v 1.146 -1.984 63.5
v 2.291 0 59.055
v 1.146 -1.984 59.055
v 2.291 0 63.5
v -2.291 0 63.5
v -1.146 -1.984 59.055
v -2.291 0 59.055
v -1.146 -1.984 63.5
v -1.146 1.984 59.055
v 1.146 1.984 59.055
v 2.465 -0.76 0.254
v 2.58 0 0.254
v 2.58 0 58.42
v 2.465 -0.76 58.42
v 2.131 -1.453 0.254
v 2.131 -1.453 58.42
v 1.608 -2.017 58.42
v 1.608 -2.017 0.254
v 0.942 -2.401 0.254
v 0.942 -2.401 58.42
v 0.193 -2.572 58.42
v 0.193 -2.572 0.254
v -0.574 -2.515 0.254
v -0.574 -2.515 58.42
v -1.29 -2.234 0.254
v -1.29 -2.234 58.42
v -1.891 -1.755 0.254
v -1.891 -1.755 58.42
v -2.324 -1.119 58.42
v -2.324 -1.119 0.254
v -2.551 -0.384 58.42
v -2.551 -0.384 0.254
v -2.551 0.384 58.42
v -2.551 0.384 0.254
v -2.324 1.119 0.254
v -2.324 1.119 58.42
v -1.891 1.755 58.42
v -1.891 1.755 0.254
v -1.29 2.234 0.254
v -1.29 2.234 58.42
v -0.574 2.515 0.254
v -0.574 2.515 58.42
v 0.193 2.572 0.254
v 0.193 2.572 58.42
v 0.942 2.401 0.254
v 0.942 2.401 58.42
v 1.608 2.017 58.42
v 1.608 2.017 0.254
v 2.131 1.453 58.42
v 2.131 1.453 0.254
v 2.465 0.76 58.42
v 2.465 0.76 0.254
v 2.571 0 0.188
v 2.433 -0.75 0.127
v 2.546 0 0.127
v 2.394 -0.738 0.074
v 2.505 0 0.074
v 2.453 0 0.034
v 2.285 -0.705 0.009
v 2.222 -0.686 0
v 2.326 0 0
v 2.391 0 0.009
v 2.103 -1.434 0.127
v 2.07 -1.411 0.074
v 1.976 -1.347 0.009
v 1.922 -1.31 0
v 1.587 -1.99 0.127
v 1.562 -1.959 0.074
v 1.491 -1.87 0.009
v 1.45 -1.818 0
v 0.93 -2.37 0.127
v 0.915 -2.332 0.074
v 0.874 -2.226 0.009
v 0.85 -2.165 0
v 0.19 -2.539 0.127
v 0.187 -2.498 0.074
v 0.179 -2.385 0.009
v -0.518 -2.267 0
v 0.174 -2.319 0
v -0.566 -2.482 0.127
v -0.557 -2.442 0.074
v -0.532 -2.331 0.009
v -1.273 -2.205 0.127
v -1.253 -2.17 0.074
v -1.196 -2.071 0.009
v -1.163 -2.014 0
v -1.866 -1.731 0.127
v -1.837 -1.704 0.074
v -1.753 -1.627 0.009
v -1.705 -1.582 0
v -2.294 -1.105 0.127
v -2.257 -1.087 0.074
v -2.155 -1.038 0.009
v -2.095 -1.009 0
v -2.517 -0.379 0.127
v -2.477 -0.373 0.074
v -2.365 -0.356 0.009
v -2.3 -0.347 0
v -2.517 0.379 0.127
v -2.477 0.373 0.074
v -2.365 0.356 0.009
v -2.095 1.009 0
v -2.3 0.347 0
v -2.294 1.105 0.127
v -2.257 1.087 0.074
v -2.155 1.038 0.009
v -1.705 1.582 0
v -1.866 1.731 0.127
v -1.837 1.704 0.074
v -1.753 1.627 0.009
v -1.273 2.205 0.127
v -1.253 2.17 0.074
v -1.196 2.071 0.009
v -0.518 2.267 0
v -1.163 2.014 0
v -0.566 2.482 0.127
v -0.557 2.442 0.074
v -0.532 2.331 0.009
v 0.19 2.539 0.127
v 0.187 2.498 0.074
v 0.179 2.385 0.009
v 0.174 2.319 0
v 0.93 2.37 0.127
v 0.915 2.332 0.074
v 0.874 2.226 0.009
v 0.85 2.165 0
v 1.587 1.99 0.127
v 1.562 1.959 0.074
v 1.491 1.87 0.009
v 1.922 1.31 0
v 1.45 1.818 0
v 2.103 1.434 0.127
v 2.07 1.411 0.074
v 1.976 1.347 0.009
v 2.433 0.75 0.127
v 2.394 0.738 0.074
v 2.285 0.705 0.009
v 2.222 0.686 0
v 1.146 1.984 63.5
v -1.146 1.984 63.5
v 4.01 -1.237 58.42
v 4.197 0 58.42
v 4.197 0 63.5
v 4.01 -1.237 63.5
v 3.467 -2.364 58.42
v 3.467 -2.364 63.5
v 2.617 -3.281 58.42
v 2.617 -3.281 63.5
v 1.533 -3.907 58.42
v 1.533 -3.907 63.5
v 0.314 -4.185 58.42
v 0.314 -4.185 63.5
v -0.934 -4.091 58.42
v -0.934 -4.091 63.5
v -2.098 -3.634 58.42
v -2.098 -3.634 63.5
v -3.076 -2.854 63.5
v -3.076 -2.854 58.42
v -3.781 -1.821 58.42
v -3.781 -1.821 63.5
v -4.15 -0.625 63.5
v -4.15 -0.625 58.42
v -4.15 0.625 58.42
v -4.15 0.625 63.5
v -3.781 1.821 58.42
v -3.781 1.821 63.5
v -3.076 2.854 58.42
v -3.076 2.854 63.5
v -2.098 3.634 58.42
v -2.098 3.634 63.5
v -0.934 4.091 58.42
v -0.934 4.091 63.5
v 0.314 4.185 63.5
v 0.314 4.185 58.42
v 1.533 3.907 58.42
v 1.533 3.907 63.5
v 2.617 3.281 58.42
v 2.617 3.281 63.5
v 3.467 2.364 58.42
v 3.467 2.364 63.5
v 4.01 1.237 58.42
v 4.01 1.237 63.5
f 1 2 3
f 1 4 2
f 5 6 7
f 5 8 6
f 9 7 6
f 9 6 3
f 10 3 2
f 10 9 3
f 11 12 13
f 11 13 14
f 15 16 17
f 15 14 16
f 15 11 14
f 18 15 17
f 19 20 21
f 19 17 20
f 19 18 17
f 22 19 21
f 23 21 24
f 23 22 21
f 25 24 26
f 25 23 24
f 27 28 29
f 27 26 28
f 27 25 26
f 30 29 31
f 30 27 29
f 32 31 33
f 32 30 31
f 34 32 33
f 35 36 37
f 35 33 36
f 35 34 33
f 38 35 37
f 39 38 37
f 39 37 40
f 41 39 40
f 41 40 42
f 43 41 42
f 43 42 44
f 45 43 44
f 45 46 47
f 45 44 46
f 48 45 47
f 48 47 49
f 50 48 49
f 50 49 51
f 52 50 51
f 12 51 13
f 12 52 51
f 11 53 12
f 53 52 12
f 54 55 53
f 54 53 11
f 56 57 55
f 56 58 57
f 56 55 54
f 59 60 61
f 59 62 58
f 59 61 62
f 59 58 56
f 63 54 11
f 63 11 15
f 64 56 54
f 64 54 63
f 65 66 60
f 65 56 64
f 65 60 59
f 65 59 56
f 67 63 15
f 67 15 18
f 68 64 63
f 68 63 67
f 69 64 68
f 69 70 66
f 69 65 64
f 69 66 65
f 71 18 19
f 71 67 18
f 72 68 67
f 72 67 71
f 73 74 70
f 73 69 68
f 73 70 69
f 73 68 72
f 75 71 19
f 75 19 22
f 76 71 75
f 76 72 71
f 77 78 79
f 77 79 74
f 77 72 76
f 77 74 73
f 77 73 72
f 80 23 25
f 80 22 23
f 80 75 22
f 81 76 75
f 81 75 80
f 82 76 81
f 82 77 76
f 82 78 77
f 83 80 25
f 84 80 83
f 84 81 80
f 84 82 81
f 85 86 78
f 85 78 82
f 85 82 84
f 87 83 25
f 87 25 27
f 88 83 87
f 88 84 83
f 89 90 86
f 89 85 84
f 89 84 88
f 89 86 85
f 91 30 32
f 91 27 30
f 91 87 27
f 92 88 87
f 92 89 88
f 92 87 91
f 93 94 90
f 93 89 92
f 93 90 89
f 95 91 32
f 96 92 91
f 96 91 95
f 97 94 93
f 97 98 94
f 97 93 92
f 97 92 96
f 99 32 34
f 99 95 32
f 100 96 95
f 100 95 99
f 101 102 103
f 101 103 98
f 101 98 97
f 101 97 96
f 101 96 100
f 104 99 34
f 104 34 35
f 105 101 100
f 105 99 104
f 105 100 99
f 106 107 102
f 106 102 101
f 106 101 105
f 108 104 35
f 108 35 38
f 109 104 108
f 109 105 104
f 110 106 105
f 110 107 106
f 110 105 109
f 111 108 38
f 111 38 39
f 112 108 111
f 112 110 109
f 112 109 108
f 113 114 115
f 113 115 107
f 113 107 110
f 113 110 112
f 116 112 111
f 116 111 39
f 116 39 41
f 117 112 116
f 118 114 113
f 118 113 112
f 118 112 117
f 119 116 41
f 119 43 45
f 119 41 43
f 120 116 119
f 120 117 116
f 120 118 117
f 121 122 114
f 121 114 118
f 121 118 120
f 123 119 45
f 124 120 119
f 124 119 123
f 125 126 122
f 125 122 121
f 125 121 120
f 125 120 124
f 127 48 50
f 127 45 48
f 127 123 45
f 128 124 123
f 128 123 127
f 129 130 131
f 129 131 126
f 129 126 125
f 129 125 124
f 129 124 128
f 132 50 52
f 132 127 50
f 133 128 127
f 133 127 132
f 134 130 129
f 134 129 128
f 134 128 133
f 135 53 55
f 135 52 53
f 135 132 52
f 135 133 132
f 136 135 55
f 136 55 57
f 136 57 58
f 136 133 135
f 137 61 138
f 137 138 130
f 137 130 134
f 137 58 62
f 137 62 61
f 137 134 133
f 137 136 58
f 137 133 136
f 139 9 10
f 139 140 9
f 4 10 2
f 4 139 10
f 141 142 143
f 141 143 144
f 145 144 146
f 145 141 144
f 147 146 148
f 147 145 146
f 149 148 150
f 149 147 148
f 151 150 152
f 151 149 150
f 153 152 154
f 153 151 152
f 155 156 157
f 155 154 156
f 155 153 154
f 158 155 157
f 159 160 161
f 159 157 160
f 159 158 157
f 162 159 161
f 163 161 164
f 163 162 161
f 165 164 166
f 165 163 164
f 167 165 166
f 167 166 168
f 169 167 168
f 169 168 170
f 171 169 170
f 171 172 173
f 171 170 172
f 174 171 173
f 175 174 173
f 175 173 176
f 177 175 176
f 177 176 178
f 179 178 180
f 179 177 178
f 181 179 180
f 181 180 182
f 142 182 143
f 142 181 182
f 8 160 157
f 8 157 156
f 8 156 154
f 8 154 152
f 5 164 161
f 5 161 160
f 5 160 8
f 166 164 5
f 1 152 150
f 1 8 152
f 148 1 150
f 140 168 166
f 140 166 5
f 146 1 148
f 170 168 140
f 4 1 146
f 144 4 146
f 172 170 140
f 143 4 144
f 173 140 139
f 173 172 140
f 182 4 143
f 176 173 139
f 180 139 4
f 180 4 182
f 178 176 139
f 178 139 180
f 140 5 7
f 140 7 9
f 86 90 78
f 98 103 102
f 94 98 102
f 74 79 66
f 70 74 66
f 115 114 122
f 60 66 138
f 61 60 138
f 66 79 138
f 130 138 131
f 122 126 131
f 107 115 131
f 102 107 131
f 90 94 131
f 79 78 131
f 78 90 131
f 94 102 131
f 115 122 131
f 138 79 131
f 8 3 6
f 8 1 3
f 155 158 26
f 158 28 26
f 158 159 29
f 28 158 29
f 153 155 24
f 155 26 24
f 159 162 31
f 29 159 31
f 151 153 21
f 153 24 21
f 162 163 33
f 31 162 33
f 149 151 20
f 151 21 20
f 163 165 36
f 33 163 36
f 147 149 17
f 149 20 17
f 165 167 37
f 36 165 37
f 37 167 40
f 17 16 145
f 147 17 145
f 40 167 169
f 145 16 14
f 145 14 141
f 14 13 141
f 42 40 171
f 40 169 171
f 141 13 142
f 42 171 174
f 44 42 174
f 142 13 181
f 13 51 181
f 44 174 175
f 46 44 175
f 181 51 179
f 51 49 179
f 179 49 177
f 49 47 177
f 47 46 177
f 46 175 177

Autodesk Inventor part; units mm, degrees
ref_plane "YZ Plane" through (0, 0, 0) normal (1, 0, 0) x (0, 1, 0)
ref_plane "XZ Plane" through (0, 0, 0) normal (0, 1, 0) x (-1, 0, 0)
ref_plane "XY Plane" through (0, 0, 0) normal (0, 0, 1) x (1, 0, 0)
sketch "Sketch1" plane through (0, 0, 0) normal (0, 0, 1) x (1, 0, 0)
  circle A0 centre (0, 0) radius 2.5797
  dimension "d0" = 5.1594
extrude "Extrusion1" add sketch "Sketch1" along normal blind 58.42
sketch "Sketch2" plane through (0, 0, 58.42) normal (0, 0, 1) x (1, 0, 0)
  circle A0 centre (0, 0) radius 4.1967
extrude "Extrusion2" add sketch "Sketch2" along normal blind 5.08
sketch "Sketch3" plane through (0, 0, 63.5) normal (0, 0, 1) x (1, 0, 0)
  line L0 (1.1457, 1.9844) -> (2.2914, 0)
  line L1 (2.2914, 0) -> (1.1457, -1.9844)
  line L2 (1.1457, -1.9844) -> (-1.1457, -1.9844)
  line L3 (-1.1457, -1.9844) -> (-2.2914, 0)
  line L4 (-2.2914, 0) -> (-1.1457, 1.9844)
  line L5 (-1.1457, 1.9844) -> (1.1457, 1.9844)
  point P0 (0, 0)
  point P1 (0, 0)
  point P2 (0, 1.9844)
  dimension "d5" = 3.9688
extrude "Extrusion3" cut sketch "Sketch3" against normal blind 4.445
thread "Thread1" size "12-24 UNC" class "2A" standard "ANSI Unified Screw Threads" length 21.59
fillet "Fillet1" radius 0.254 1 edges at (-2.5797, 0, 0)
properties part number "10 l 20 2 1 l 2 bolt"
